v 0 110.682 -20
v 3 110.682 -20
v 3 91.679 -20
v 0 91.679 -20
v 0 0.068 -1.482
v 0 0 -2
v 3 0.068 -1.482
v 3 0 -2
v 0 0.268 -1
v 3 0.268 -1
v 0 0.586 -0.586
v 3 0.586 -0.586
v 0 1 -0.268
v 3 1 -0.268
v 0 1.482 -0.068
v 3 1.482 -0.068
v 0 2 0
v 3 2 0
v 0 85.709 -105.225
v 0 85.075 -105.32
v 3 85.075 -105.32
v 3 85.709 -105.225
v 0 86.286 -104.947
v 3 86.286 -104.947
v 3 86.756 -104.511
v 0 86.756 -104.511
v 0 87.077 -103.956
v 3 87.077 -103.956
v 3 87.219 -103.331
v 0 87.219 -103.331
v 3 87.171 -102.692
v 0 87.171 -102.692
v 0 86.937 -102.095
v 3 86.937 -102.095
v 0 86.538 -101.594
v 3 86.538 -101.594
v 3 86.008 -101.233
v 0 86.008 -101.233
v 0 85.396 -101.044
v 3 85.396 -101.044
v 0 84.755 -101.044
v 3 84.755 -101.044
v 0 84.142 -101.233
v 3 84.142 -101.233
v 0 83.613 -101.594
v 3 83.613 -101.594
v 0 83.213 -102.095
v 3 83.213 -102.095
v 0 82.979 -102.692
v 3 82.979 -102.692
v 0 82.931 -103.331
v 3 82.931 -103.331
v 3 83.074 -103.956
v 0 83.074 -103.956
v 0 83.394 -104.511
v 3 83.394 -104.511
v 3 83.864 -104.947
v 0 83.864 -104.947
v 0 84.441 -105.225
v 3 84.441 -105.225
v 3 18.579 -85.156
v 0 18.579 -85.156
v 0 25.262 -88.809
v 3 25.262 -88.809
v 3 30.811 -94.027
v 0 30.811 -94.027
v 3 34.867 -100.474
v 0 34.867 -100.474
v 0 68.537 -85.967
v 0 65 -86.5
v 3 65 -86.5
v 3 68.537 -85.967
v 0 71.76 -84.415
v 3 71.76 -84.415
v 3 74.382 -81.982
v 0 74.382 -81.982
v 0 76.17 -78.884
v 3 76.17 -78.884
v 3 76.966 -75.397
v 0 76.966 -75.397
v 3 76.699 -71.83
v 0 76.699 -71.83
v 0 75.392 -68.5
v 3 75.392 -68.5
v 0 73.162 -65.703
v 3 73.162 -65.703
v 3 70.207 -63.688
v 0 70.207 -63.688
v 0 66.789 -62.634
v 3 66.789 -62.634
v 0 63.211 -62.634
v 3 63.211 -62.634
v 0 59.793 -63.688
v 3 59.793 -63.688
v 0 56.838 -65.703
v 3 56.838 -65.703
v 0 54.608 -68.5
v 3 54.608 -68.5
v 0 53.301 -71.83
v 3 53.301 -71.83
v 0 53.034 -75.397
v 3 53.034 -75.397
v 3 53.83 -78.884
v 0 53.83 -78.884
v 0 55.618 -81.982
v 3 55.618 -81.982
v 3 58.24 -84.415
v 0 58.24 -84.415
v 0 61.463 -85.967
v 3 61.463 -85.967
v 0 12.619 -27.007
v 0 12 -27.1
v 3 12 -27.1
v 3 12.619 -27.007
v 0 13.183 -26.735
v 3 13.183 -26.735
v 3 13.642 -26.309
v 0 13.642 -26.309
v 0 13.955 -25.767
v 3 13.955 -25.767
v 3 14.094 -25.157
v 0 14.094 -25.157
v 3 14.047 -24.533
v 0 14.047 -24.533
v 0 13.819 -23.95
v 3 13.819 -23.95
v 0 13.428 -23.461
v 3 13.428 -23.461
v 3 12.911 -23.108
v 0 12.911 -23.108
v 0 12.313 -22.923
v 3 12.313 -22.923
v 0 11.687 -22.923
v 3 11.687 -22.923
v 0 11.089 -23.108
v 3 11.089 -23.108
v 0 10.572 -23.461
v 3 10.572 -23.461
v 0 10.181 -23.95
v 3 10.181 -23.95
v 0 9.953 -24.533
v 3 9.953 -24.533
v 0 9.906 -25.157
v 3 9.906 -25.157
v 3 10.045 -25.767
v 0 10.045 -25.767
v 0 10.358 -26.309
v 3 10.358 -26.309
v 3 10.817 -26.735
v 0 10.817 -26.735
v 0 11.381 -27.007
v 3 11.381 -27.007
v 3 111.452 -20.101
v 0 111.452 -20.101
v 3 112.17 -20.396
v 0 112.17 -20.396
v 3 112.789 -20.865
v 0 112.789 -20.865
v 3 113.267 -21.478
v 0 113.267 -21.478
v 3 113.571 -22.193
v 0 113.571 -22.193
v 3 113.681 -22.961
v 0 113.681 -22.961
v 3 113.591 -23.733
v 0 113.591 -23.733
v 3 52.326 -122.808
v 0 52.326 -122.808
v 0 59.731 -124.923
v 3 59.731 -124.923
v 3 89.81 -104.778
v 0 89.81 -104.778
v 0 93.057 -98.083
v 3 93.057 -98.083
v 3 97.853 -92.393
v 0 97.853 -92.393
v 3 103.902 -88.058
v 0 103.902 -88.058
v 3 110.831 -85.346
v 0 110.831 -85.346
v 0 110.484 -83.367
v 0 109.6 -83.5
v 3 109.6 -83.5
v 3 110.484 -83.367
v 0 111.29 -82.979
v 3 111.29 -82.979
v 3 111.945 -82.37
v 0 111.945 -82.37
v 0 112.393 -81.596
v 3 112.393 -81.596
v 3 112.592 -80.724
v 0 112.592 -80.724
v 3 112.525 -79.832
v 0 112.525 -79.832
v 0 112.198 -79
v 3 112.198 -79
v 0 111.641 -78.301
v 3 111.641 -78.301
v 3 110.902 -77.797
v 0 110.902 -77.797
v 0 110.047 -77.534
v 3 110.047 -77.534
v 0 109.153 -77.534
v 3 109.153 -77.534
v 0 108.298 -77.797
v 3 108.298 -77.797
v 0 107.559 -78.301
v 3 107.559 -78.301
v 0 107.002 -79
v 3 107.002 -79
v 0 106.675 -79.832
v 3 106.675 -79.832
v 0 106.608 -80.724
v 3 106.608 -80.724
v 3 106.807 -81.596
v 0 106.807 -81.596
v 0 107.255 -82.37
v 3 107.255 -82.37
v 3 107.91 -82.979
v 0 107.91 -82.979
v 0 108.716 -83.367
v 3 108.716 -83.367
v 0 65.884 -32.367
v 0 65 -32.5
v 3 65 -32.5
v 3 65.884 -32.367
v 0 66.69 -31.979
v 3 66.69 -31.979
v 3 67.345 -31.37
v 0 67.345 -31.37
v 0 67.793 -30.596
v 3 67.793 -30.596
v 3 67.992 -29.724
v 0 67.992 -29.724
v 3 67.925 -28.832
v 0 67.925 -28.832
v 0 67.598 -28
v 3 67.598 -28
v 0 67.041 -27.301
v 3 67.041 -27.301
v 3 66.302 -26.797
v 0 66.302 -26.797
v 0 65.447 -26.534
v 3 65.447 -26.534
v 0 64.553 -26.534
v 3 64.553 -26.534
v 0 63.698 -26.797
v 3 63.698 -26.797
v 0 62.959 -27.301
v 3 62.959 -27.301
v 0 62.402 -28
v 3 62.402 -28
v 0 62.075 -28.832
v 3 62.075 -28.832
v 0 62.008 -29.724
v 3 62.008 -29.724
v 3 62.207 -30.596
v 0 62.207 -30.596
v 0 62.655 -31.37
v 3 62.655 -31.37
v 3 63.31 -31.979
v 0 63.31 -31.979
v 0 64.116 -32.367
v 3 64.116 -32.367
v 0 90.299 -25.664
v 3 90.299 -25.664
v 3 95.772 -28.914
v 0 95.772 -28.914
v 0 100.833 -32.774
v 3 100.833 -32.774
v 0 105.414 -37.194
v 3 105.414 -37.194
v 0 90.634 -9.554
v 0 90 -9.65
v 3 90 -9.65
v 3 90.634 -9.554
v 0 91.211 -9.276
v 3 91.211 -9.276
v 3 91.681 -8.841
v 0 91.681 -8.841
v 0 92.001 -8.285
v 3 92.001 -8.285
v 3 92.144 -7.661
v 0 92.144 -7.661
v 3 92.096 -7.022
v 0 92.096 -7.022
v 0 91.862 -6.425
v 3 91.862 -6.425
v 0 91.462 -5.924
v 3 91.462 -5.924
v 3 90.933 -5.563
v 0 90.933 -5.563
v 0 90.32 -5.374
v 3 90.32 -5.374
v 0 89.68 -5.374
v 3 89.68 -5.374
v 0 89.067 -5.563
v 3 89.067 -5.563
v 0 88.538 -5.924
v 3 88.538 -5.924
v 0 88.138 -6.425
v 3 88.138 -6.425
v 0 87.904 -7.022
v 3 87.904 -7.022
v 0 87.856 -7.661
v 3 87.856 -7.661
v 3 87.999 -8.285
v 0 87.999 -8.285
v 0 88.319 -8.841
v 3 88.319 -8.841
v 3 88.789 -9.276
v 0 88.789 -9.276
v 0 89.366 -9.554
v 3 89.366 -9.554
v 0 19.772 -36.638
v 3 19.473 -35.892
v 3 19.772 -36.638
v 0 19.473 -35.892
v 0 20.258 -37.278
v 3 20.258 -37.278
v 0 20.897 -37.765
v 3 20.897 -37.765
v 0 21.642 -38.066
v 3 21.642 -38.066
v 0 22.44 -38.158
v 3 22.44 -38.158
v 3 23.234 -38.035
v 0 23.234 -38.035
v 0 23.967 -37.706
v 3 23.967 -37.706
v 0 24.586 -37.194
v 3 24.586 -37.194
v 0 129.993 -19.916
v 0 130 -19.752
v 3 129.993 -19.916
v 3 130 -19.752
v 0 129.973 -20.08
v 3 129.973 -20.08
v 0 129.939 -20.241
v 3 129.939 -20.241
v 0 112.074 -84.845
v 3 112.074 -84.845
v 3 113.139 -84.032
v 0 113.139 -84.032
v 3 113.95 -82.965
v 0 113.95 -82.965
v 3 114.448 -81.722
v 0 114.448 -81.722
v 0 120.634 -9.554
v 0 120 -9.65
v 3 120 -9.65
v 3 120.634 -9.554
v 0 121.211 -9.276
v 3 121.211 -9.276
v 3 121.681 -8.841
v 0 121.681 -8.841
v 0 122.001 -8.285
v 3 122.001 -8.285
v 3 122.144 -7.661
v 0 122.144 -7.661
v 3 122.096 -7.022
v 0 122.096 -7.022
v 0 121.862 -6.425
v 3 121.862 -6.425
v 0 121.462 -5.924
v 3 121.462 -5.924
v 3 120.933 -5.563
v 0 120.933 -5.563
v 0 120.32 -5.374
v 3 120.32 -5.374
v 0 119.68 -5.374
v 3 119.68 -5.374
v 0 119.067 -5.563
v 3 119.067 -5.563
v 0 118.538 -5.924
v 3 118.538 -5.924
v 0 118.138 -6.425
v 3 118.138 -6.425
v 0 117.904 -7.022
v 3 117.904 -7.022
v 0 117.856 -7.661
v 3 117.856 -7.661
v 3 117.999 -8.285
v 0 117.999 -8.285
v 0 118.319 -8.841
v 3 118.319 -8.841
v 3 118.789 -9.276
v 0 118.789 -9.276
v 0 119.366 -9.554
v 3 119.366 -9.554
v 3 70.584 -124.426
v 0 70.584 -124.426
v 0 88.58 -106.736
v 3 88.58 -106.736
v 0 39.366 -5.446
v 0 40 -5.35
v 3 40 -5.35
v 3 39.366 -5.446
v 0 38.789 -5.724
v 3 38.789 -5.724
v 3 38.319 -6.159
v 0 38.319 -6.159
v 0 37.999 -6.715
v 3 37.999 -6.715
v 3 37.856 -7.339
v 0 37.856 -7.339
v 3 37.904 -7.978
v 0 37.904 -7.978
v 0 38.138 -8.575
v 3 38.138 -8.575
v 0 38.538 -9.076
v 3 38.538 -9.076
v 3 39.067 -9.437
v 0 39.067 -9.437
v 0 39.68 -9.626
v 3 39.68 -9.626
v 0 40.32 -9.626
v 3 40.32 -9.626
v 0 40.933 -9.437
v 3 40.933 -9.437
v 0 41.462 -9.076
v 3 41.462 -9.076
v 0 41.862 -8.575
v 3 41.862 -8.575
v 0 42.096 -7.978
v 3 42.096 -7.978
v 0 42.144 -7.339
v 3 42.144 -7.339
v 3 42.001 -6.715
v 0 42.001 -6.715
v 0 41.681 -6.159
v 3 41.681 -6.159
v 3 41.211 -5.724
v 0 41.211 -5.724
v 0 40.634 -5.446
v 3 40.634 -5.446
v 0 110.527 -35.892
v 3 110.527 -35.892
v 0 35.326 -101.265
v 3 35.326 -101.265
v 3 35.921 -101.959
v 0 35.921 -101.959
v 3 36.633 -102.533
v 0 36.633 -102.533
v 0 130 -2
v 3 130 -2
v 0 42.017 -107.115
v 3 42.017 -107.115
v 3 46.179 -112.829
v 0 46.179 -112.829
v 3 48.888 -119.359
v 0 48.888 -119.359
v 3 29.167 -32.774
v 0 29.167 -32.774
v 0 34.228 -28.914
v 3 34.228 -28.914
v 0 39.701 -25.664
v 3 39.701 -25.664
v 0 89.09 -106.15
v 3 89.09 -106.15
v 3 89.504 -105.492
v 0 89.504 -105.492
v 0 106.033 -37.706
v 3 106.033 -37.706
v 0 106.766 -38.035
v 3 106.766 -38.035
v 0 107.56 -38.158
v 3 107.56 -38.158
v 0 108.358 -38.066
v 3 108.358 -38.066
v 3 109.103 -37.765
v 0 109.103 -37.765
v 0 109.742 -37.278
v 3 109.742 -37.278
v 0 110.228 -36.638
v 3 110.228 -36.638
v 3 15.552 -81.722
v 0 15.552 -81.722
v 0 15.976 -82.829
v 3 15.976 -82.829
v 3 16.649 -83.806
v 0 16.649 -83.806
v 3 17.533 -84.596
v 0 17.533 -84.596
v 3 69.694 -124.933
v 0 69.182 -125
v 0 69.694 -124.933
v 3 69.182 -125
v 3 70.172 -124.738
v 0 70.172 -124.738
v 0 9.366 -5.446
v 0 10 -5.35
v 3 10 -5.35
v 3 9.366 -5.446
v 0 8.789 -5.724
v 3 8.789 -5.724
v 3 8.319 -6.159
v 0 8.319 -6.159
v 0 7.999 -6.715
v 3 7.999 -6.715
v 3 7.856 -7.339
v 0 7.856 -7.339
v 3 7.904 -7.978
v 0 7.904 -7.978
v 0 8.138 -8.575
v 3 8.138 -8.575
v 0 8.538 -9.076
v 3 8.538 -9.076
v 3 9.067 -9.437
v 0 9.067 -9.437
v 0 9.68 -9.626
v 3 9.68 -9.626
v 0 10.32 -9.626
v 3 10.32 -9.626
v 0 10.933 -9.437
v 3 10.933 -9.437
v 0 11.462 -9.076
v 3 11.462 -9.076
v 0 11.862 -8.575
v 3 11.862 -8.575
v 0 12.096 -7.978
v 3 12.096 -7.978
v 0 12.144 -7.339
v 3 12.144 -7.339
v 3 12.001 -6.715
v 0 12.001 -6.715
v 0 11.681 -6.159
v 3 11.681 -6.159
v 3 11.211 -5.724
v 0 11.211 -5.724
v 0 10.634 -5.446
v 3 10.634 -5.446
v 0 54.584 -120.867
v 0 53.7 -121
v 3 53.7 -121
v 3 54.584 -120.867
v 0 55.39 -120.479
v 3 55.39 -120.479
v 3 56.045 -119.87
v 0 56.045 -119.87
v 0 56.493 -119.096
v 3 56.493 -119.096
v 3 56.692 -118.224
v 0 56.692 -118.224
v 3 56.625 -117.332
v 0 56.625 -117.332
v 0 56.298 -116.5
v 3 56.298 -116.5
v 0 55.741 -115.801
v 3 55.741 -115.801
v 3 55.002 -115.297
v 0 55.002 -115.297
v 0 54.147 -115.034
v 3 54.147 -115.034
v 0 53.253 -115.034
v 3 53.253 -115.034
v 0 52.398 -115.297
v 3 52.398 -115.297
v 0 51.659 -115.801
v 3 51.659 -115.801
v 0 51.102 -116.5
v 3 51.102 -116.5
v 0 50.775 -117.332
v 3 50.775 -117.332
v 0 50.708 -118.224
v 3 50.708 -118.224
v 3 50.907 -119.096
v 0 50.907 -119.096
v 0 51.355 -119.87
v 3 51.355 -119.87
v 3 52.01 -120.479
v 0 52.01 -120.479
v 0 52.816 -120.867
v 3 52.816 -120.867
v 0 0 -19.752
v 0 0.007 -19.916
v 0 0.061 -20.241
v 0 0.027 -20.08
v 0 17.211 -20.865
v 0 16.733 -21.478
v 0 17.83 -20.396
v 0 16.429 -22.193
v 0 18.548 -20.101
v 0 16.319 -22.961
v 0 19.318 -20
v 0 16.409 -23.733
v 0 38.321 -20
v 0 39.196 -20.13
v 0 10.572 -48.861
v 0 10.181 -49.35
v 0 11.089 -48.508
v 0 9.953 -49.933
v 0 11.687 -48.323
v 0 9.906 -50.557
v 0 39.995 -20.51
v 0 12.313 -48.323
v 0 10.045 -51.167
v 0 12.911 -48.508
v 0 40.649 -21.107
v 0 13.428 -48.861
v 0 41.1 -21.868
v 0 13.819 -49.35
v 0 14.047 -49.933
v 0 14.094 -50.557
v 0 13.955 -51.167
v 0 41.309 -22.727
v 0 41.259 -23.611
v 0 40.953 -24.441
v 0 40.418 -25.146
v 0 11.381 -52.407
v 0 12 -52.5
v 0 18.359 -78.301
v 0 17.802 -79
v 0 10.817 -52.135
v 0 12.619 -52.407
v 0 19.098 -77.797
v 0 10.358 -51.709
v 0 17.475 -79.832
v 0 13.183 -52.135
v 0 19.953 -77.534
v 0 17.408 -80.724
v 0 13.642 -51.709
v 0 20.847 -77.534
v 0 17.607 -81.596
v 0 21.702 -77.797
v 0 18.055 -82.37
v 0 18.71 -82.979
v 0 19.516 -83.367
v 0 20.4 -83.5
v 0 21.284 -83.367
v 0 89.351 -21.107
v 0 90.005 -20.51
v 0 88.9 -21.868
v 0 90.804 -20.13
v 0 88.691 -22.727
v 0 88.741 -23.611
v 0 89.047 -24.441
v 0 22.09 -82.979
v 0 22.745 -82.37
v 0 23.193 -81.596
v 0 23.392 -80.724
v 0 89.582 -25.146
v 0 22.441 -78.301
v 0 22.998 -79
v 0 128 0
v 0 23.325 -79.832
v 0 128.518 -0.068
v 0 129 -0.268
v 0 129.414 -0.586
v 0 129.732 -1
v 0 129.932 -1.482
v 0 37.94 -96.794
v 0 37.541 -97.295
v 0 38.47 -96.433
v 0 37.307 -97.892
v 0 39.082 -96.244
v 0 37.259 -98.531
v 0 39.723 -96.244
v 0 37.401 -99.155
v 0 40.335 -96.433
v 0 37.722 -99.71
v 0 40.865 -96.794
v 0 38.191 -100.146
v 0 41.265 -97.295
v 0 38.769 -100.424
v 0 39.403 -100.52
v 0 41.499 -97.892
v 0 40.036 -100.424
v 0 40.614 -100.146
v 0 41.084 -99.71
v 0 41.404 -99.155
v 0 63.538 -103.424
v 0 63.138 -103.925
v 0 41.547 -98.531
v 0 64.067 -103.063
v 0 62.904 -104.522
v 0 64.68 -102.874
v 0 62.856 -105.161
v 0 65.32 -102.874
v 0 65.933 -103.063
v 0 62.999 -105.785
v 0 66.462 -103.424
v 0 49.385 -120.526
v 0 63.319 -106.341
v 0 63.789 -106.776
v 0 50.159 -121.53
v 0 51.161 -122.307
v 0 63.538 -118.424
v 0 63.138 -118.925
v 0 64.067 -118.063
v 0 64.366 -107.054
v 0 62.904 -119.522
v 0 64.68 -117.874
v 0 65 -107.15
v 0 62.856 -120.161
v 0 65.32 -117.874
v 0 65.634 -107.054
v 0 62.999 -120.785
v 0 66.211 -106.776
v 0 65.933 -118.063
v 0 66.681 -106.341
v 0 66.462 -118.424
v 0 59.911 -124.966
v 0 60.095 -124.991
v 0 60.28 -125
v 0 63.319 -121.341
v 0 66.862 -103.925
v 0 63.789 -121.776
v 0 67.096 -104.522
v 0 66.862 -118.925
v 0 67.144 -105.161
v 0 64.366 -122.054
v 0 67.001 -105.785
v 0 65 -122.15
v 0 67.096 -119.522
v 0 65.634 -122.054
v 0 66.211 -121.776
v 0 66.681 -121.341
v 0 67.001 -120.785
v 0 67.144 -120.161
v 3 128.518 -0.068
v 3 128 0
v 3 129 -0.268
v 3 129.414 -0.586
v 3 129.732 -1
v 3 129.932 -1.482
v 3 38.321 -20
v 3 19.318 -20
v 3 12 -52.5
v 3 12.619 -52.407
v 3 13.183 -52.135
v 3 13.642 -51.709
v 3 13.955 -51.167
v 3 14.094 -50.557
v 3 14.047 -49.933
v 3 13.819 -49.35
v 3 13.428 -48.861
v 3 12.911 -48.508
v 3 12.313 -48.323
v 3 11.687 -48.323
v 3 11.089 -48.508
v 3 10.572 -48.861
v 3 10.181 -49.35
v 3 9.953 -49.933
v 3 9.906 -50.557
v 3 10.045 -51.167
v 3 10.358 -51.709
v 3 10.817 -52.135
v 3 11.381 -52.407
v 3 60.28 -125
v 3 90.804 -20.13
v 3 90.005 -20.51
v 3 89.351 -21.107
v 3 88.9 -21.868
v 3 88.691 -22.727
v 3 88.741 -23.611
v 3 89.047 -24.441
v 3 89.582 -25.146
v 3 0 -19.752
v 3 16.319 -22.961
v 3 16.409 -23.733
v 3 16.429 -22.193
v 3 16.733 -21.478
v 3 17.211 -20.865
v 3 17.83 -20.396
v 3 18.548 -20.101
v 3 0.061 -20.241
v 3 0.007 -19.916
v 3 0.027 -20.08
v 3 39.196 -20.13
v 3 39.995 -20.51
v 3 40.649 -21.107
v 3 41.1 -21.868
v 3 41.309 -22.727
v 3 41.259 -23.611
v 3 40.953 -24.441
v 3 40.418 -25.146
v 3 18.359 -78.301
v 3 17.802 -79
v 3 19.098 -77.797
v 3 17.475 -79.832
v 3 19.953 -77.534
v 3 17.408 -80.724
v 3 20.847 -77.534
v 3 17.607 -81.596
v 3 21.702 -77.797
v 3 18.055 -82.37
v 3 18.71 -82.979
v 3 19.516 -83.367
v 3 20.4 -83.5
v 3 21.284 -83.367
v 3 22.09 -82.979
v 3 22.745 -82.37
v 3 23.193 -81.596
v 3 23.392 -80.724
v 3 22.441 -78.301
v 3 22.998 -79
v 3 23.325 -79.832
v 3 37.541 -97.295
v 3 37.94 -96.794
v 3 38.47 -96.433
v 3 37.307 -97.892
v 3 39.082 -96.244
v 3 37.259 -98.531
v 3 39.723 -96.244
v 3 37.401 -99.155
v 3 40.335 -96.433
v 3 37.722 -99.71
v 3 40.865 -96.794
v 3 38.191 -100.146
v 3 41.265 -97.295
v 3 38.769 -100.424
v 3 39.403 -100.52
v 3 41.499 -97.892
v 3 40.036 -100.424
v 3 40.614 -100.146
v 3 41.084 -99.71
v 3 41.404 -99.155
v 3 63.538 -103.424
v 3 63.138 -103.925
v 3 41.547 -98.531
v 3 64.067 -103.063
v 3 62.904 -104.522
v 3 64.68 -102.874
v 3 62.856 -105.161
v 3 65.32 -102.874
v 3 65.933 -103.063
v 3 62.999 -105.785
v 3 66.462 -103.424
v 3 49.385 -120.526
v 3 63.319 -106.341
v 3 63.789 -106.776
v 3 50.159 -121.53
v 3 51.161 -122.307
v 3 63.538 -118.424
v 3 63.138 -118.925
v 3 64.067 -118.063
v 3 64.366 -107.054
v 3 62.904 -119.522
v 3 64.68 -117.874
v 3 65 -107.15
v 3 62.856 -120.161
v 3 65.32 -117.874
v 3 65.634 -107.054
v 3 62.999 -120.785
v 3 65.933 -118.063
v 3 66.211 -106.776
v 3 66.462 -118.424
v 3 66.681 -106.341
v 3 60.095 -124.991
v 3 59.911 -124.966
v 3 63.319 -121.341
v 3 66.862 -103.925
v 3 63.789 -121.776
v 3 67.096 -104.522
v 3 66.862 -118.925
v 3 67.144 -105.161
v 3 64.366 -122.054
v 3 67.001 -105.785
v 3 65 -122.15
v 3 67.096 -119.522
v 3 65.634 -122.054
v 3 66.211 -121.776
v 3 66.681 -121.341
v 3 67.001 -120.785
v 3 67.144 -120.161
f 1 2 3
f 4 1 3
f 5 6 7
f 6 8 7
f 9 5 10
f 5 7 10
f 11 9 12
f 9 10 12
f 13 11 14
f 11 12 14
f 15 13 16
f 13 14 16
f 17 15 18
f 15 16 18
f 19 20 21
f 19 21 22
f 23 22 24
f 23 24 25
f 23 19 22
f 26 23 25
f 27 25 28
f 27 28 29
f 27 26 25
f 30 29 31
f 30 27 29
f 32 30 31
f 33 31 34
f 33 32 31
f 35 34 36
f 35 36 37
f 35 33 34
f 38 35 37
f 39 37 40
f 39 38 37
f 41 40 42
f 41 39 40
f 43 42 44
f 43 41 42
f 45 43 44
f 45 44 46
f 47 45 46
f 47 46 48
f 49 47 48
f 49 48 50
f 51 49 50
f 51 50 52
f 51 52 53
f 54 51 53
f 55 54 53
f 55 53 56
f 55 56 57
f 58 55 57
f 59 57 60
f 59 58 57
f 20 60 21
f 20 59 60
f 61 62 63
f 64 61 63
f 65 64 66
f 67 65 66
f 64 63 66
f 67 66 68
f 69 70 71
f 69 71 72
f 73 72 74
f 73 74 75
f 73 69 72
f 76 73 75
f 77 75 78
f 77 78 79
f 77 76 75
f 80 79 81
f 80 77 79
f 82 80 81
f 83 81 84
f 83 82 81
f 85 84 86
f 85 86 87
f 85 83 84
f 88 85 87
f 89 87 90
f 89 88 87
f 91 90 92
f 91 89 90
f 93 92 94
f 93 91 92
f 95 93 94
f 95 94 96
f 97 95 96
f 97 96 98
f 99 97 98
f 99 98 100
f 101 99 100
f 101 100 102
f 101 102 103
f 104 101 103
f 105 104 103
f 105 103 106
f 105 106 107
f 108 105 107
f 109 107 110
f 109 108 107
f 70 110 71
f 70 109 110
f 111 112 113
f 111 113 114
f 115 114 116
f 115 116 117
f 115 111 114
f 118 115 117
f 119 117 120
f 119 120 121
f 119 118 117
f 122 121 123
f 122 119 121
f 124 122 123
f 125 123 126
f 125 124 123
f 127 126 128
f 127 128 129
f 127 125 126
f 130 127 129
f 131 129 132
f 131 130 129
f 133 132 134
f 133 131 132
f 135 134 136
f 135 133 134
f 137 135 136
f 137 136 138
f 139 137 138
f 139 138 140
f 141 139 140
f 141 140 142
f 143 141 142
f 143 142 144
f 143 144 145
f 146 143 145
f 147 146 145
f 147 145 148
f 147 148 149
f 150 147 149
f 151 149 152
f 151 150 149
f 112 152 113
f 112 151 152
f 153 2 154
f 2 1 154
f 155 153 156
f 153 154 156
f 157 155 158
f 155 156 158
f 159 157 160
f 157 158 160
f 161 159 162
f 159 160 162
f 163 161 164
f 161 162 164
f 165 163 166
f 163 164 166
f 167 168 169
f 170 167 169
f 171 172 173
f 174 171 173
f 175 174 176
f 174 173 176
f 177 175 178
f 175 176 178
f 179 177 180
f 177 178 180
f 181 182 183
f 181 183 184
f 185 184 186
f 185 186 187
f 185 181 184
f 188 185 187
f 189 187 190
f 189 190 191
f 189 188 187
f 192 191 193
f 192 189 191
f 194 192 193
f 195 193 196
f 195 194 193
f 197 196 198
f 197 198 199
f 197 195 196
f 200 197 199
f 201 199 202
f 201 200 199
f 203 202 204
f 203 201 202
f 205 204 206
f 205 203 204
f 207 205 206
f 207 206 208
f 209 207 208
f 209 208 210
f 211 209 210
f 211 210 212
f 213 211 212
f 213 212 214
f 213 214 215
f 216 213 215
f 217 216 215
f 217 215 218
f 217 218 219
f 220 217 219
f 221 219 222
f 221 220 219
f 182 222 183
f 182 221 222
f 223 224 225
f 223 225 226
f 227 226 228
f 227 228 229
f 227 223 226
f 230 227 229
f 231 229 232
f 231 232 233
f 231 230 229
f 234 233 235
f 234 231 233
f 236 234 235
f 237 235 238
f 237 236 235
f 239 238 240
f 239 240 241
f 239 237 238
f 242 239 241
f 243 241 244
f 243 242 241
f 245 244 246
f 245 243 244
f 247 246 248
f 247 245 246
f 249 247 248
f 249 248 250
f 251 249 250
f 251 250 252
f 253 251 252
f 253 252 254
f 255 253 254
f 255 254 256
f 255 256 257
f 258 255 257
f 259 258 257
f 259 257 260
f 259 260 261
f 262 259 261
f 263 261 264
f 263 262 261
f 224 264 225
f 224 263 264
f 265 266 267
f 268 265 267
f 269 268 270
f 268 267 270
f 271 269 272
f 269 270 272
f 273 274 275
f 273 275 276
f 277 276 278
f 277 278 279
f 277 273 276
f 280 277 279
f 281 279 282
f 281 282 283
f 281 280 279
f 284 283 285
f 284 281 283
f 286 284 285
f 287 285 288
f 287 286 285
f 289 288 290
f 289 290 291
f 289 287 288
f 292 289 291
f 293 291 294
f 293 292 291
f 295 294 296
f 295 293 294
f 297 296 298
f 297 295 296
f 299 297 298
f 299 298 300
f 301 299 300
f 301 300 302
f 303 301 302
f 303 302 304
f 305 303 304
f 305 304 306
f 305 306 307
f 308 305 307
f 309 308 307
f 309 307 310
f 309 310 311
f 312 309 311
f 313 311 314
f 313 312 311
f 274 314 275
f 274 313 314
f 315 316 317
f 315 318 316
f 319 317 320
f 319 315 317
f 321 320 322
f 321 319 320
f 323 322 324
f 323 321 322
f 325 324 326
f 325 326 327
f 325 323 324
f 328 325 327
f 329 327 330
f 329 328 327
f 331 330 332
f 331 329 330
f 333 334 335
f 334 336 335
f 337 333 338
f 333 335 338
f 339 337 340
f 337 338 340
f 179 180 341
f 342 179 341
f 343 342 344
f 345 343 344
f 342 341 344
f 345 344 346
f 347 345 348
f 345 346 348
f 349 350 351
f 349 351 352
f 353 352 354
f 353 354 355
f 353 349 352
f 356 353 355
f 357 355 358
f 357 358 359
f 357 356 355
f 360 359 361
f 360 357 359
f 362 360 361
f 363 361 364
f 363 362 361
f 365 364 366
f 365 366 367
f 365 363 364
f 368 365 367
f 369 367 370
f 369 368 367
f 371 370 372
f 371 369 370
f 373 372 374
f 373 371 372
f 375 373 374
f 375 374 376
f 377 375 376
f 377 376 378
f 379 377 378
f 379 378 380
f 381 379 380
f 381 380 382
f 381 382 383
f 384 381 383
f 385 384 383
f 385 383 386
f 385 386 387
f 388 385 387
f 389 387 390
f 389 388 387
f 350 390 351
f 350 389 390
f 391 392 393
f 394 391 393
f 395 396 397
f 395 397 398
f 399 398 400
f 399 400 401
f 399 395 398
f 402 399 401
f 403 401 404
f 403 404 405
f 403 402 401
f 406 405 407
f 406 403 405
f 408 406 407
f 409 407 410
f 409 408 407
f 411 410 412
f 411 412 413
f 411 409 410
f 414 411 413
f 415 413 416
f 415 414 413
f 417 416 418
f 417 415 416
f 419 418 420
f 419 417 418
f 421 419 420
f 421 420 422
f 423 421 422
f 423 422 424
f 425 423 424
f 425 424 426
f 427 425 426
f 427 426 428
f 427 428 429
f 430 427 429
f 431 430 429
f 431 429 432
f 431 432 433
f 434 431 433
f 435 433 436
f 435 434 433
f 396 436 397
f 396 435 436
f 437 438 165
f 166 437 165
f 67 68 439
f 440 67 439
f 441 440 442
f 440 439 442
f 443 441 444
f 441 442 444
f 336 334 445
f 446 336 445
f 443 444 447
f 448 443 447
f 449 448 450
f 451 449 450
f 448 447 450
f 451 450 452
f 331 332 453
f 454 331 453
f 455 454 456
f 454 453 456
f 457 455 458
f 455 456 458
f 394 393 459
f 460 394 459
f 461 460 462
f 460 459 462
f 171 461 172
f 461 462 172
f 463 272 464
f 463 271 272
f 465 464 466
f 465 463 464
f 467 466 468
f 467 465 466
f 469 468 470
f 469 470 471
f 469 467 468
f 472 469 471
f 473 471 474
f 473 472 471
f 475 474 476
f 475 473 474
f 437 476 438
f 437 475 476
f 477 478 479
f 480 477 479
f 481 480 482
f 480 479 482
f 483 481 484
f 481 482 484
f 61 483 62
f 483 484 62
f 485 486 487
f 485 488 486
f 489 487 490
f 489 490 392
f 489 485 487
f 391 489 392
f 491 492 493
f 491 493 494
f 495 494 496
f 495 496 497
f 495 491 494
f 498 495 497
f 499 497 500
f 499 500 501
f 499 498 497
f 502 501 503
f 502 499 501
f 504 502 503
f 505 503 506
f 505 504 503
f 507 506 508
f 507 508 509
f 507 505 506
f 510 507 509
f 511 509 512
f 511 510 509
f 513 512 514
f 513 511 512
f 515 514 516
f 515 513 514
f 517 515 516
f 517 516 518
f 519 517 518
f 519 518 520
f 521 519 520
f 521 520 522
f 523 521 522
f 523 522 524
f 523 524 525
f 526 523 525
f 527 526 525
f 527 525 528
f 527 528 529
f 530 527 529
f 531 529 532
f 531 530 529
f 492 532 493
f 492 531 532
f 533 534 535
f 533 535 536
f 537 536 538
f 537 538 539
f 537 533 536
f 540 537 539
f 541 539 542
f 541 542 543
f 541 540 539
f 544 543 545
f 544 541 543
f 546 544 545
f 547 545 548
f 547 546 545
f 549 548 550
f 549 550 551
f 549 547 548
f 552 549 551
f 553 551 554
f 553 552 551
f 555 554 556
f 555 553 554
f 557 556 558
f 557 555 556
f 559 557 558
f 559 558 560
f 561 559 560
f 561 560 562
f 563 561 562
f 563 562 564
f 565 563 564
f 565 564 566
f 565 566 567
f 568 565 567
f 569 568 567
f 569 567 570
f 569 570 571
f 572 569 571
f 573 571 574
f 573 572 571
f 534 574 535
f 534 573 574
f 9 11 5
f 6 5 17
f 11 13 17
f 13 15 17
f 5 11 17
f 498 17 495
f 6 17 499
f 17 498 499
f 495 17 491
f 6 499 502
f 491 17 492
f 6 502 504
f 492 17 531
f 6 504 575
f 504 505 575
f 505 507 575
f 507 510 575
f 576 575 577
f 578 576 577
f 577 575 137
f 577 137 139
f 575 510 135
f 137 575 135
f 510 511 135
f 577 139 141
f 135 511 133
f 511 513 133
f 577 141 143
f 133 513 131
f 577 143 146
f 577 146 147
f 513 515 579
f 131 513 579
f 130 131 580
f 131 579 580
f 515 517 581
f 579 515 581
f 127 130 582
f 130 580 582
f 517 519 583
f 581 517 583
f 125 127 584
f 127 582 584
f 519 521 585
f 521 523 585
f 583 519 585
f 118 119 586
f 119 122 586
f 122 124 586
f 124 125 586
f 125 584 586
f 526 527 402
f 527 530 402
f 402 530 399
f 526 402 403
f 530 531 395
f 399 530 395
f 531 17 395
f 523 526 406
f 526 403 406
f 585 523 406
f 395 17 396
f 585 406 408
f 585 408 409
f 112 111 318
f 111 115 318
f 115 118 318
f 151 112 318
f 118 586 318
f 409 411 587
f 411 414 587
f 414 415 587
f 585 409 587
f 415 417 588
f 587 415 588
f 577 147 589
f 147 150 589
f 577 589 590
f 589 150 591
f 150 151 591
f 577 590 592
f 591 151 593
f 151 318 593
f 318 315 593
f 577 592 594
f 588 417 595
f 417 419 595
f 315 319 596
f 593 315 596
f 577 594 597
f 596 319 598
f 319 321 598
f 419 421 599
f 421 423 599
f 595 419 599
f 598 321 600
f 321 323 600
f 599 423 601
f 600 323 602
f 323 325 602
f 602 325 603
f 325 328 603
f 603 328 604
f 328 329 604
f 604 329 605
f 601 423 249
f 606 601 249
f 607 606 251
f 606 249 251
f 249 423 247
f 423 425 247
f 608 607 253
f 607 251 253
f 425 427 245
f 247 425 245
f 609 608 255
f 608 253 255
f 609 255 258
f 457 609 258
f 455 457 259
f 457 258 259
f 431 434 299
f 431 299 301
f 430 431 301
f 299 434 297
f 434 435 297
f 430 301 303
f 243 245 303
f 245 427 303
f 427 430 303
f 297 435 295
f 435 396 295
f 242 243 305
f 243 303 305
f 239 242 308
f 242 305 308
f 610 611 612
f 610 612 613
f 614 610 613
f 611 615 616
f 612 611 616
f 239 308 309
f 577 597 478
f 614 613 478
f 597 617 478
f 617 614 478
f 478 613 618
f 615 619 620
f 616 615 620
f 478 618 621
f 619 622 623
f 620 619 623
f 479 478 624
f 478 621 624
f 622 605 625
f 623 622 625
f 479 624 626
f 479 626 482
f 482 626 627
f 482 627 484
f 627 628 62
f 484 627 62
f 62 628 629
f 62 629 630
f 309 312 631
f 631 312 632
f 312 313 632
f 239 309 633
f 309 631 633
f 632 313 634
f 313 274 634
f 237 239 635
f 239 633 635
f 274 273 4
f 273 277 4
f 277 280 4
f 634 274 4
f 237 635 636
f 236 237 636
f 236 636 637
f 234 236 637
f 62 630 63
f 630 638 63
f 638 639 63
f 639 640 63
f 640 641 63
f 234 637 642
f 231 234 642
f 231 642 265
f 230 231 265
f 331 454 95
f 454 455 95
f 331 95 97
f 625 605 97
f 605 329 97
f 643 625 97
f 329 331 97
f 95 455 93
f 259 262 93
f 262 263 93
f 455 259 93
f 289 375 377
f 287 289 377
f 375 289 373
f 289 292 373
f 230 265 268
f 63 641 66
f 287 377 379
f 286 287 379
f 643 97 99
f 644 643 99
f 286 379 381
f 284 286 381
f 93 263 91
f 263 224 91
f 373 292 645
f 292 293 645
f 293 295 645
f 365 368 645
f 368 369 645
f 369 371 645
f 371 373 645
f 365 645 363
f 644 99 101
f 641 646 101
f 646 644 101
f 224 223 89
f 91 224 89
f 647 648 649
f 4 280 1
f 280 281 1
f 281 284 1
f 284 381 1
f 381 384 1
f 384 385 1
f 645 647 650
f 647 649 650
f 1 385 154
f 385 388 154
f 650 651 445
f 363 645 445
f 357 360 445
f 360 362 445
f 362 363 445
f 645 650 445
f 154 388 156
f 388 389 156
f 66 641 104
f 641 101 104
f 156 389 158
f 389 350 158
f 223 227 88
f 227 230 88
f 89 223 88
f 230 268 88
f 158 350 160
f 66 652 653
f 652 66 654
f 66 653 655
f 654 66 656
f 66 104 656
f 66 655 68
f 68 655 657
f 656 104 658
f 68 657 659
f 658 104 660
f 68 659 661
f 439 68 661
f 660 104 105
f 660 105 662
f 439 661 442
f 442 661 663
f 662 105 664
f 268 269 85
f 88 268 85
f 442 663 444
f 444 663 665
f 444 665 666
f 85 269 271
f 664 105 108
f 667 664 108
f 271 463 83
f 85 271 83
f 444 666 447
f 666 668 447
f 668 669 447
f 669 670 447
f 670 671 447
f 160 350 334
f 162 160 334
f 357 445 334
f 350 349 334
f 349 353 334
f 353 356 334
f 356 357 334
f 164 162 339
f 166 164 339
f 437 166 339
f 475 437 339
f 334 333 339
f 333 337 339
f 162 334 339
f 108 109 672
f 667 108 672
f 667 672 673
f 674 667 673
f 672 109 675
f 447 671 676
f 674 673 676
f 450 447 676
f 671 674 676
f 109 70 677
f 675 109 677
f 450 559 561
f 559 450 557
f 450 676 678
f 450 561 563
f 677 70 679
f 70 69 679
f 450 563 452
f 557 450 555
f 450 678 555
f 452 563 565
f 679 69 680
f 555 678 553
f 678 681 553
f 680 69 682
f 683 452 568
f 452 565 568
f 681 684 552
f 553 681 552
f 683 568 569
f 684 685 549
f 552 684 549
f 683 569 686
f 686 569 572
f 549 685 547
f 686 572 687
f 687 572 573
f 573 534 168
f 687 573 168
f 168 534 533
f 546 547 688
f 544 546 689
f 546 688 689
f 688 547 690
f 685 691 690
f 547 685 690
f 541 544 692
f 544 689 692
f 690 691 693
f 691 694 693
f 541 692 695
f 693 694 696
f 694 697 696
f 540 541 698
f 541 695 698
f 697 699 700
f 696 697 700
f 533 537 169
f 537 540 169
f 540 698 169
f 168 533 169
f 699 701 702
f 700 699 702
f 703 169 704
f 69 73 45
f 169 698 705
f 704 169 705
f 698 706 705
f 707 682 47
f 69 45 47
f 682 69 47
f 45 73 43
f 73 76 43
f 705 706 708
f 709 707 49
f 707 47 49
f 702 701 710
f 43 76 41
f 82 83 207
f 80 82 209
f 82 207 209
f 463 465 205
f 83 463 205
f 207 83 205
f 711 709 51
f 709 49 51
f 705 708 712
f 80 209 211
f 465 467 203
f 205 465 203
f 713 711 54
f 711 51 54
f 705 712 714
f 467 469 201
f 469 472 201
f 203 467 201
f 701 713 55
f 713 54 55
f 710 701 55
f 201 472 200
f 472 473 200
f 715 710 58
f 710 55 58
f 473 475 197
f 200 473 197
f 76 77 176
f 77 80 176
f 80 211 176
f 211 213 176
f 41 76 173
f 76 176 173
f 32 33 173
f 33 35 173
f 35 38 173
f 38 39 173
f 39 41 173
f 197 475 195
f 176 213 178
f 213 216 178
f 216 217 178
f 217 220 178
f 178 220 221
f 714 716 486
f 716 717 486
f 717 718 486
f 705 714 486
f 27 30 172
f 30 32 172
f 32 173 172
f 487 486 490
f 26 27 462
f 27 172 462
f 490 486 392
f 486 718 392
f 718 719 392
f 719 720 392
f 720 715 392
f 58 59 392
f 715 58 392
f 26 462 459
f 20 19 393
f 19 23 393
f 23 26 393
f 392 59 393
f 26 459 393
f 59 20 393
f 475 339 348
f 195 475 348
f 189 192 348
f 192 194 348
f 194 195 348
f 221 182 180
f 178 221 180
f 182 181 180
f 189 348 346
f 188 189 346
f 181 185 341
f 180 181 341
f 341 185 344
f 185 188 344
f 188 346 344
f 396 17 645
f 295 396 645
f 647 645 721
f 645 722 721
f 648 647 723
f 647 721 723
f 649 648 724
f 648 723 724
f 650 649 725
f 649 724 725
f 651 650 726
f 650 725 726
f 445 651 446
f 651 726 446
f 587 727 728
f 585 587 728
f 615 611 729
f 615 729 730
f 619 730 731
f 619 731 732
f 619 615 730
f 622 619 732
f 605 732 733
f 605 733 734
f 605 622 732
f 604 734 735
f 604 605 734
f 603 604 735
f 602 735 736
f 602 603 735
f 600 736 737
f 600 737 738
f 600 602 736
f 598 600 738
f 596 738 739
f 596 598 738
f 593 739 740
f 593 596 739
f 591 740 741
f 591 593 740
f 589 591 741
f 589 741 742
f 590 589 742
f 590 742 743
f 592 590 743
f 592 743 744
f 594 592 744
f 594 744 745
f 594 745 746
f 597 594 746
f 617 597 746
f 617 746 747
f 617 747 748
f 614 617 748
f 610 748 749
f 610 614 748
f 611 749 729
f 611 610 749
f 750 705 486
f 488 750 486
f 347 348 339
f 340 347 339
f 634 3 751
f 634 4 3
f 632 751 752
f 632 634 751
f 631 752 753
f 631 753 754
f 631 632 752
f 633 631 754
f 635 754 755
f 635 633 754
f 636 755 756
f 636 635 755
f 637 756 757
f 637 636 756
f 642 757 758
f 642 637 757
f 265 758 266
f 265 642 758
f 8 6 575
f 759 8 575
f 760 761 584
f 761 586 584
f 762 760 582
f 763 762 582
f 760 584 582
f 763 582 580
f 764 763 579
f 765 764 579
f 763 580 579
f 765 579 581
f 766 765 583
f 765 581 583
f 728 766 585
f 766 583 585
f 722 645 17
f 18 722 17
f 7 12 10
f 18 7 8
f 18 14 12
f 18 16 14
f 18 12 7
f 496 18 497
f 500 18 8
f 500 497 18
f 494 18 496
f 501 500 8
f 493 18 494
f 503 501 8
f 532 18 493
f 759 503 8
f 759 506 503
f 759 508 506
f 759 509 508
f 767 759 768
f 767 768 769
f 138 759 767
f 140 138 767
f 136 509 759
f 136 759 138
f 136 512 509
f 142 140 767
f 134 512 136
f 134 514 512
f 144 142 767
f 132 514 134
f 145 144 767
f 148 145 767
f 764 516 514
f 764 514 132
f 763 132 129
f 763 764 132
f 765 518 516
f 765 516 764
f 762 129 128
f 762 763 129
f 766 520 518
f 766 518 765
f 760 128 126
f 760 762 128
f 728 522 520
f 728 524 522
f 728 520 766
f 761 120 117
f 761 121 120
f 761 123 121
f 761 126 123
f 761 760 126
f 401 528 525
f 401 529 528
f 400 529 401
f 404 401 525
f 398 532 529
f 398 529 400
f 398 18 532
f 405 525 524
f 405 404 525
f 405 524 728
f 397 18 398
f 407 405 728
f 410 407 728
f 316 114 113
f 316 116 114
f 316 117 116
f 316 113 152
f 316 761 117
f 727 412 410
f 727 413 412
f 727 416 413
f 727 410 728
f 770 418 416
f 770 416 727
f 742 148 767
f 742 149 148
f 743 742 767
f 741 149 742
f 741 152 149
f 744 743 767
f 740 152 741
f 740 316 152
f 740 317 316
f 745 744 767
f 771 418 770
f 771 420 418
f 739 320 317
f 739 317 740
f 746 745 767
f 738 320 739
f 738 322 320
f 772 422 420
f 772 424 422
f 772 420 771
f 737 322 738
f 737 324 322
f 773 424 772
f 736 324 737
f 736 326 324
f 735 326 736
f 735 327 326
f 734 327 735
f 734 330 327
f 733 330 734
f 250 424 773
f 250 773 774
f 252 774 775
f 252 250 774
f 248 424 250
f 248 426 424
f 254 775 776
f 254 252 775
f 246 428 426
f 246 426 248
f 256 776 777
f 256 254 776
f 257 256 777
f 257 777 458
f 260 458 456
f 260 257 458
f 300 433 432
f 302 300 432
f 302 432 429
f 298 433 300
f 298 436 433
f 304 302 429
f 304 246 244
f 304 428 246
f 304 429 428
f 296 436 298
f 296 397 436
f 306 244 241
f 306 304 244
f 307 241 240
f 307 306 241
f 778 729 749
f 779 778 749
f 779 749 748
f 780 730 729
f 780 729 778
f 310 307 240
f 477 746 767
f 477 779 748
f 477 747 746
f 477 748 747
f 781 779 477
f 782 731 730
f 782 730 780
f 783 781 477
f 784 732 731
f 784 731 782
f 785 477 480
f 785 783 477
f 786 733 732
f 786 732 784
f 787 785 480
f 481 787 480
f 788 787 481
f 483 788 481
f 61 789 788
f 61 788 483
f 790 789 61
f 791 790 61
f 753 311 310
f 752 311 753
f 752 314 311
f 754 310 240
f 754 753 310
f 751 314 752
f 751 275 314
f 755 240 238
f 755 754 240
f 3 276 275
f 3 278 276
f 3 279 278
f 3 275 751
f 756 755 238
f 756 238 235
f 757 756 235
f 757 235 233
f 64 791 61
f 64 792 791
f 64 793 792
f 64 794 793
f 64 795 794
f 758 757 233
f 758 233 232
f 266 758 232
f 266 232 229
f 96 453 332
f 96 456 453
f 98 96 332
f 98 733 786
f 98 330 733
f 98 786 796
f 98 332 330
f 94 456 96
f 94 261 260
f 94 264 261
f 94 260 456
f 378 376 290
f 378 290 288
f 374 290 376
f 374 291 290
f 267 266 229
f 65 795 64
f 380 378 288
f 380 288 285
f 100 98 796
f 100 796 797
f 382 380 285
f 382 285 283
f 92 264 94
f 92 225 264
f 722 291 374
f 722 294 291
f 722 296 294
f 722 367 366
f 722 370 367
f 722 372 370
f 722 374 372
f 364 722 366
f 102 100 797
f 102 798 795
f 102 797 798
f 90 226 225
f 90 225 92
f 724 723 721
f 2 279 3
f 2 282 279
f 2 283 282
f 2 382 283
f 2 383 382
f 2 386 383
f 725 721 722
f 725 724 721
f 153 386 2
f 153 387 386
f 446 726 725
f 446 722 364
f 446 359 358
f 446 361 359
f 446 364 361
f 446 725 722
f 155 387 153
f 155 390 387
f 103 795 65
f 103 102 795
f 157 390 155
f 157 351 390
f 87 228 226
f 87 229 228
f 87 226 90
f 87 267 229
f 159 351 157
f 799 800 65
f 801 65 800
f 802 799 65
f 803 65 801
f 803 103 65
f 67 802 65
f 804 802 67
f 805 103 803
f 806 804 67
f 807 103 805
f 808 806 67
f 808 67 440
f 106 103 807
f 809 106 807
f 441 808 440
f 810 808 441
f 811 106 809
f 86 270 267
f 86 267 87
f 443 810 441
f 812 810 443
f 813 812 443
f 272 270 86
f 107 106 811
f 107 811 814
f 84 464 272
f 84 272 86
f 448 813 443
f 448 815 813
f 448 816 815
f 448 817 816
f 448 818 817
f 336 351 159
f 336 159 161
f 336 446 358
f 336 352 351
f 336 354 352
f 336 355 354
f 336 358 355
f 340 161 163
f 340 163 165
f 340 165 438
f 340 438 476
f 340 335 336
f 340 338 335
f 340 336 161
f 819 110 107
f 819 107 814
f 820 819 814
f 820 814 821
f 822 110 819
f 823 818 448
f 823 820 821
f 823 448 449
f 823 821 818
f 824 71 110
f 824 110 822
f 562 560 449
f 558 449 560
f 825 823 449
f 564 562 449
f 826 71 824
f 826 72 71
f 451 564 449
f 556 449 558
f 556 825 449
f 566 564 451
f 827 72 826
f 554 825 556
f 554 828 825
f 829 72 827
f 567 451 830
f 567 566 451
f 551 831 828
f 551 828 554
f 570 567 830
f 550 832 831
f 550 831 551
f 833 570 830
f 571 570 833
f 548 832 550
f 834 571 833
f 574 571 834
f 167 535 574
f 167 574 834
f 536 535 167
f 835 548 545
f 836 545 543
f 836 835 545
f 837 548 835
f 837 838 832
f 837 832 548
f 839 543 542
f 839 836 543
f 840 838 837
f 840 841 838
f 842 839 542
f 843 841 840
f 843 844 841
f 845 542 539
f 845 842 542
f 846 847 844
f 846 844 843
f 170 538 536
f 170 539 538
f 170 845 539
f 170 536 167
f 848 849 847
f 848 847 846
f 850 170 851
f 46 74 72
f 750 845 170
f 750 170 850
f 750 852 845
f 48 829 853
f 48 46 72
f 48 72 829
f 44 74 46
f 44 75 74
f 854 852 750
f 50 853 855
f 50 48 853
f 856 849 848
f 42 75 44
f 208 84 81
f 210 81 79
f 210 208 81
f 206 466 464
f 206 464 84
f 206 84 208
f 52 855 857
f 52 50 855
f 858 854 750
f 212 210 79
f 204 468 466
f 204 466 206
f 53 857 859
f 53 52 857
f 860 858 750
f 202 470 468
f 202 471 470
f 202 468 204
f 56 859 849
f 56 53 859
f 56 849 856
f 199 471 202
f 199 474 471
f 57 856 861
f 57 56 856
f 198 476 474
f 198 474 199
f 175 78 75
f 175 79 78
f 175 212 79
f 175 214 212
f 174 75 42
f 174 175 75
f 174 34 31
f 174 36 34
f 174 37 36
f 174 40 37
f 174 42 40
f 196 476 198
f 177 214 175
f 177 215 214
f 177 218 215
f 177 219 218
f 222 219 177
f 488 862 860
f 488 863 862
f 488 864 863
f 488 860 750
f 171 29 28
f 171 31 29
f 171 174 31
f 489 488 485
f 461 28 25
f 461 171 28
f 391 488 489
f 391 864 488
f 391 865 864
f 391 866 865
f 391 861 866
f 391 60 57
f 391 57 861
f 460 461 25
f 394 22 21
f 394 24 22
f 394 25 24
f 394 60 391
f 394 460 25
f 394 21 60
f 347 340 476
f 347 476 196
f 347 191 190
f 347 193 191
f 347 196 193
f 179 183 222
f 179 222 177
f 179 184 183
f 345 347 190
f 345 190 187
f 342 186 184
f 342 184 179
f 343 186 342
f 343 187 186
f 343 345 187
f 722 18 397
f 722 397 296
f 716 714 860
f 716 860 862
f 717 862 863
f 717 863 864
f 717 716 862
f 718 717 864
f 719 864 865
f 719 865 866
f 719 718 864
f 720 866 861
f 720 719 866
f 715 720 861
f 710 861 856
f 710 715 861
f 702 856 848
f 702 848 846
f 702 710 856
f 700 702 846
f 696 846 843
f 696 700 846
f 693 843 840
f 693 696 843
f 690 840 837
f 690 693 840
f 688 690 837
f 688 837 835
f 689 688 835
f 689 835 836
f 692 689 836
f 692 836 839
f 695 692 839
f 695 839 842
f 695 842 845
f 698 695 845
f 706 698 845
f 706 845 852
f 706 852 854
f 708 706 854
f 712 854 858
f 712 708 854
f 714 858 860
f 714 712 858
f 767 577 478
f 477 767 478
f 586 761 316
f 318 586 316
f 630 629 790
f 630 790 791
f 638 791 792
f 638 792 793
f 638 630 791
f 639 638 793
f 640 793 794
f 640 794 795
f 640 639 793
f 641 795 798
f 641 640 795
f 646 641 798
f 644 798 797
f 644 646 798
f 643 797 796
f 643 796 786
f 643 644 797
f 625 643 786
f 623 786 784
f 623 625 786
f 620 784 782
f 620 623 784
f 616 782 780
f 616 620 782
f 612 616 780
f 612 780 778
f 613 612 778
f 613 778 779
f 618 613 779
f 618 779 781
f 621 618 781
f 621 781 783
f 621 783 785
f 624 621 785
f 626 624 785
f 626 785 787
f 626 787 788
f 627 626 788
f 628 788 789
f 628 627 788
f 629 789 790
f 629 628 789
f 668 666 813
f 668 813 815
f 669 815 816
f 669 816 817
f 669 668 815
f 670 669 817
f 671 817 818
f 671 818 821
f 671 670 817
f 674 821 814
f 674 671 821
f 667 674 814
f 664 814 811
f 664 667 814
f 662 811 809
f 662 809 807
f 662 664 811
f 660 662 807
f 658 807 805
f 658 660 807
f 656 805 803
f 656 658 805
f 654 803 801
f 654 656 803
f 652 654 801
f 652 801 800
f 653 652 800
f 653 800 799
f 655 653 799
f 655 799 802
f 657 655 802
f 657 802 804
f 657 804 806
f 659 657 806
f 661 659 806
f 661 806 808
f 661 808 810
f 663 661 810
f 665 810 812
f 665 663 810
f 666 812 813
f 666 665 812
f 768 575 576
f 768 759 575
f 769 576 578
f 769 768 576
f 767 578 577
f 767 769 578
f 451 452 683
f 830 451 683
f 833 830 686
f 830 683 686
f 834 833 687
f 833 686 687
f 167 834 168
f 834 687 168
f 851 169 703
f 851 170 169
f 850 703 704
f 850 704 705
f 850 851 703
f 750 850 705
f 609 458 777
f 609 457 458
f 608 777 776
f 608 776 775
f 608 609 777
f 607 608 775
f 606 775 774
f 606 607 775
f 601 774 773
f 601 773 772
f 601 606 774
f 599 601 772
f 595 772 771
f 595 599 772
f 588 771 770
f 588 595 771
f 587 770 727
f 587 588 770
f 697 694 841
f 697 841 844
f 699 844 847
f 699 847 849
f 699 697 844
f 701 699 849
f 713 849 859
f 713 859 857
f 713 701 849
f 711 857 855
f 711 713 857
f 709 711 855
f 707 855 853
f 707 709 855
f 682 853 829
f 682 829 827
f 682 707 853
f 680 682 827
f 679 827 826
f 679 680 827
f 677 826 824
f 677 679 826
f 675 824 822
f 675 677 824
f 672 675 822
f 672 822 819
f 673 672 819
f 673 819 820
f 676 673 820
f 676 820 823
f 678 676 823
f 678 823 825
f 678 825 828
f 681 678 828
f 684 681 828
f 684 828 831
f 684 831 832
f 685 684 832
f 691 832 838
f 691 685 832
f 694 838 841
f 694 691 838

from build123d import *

# Parameters (mm, degrees)
SKETCH_1_R          = 2.15
SKETCH_1_R_2        = 12
SKETCH_1_R_3        = 3
SKETCH_1_R_4        = 2.1
EXTRUDE_1_DEPTH     = 3
CUT_EXTRUDE_1_DEPTH = 3
FILLET_1_R          = 2
FILLET_2_R          = 2
FILLET_3_R          = 3


with BuildPart() as part:
    # ｽｹｯﾁ1 → ﾎﾞｽ - 押し出し1 (new body)
    with BuildSketch(Plane(origin=(0, 0, 0), x_dir=(0, 0, -1), z_dir=(1, 0, 0))):
        with BuildLine():
            Line((0, 0), (20, 0))
            Line((20, 0), (81.721631315, 15.55153458))
            ThreePointArc((81.721631315, 15.55153458), (83.805915962, 16.648877548), (85.156498305, 18.57873024))
            ThreePointArc((85.156498305, 18.57873024), (91.240951268, 28.202978223), (100.473591964, 34.86669062))
            ThreePointArc((100.473591964, 34.86669062), (101.625387424, 35.607613327), (102.53294649, 36.633252532))
            ThreePointArc((102.53294649, 36.633252532), (109.848876527, 44.266796828), (119.358709974, 48.888149295))
            ThreePointArc((119.358709974, 48.888149295), (121.530071674, 50.159012288), (122.807632728, 52.326439826))
            Line((122.807632728, 52.326439826), (125, 60))
            Line((125, 60), (125, 70))
            Line((125, 70), (106.736076333, 88.580227744))
            ThreePointArc((106.736076333, 88.580227744), (105.828986144, 89.309735766), (104.777796911, 89.809731531))
            ThreePointArc((104.777796911, 89.809731531), (92.392887273, 97.853140314), (85.346092725, 110.831009869))
            ThreePointArc((85.346092725, 110.831009869), (84.032111964, 113.138952539), (81.721631315, 114.44846542))
            Line((81.721631315, 114.44846542), (20, 130))
            Line((20, 130), (0, 130))
            Line((0, 130), (0, 0))
        make_face()
        with Locations((7.5, 120)):
            Circle(SKETCH_1_R, mode=Mode.SUBTRACT)
        with Locations((7.5, 90)):
            Circle(SKETCH_1_R, mode=Mode.SUBTRACT)
        with Locations(Location((7.5, 40, 0), (0, 0, 180))):
            Circle(SKETCH_1_R, mode=Mode.SUBTRACT)
        with Locations(Location((7.5, 10, 0), (0, 0, 180))):
            Circle(SKETCH_1_R, mode=Mode.SUBTRACT)
        with Locations((74.5, 65)):
            Circle(SKETCH_1_R_2, mode=Mode.SUBTRACT)
        with Locations((29.5, 65)):
            Circle(SKETCH_1_R_3, mode=Mode.SUBTRACT)
        with Locations((80.5, 20.4)):
            Circle(SKETCH_1_R_3, mode=Mode.SUBTRACT)
        with Locations((118, 53.7)):
            Circle(SKETCH_1_R_3, mode=Mode.SUBTRACT)
        with Locations((80.5, 109.6)):
            Circle(SKETCH_1_R_3, mode=Mode.SUBTRACT)
        with Locations((103.17032155, 85.075175272)):
            Circle(SKETCH_1_R, mode=Mode.SUBTRACT)
        with Locations((98.369942602, 39.402620443)):
            Circle(SKETCH_1_R, mode=Mode.SUBTRACT)
        with Locations((105, 65)):
            Circle(SKETCH_1_R, mode=Mode.SUBTRACT)
        with Locations((120, 65)):
            Circle(SKETCH_1_R, mode=Mode.SUBTRACT)
        with Locations((25, 12)):
            Circle(SKETCH_1_R_4, mode=Mode.SUBTRACT)
        with Locations((50.4, 12)):
            Circle(SKETCH_1_R_4, mode=Mode.SUBTRACT)
    extrude(amount=EXTRUDE_1_DEPTH)

    # ｽｹｯﾁ2 → ｶｯﾄ - 押し出し1 (cut)
    with BuildSketch(Plane(origin=(3, 0, 0), x_dir=(0, 0, -1), z_dir=(1, 0, 0))):
        with BuildLine():
            Line((20, 114.531188015), (20, 72.399324293))
            ThreePointArc((20, 72.399324293), (27.112840869, 92.918759813), (41.614001532, 109.085270837))
            Line((41.614001532, 109.085270837), (20, 114.531188015))
        make_face()
        with BuildLine():
            Line((20, 15.468811985), (41.614001532, 20.914729163))
            ThreePointArc((41.614001532, 20.914729163), (27.112840869, 37.081240187), (20, 57.600675707))
            Line((20, 57.600675707), (20, 15.468811985))
        make_face()
    extrude(amount=-CUT_EXTRUDE_1_DEPTH, mode=Mode.SUBTRACT)

    # ﾌｨﾚｯﾄ1
    fillet_1_edges = [part.edges().sort_by_distance(p)[0] for p in [
        (1.5, 130, 0),
        (1.5, 130, -20),
        (1.5, 0, -20),
        (1.5, 0, 0),
    ]]
    fillet(fillet_1_edges, radius=FILLET_1_R)

    # ﾌｨﾚｯﾄ2
    fillet_2_edges = [part.edges().sort_by_distance(p)[0] for p in [
        (1.5, 70, -125),
        (1.5, 60, -125),
    ]]
    fillet(fillet_2_edges, radius=FILLET_2_R)

    # ﾌｨﾚｯﾄ3
    fillet_3_edges = [part.edges().sort_by_distance(p)[0] for p in [
        (1.5, 114.531188015, -20),
        (1.5, 109.085270837, -41.614001532),
        (1.5, 72.399324293, -20),
        (1.5, 15.468811985, -20),
        (1.5, 57.600675707, -20),
        (1.5, 20.914729163, -41.614001532),
    ]]
    fillet(fillet_3_edges, radius=FILLET_3_R)


solid = part.part
